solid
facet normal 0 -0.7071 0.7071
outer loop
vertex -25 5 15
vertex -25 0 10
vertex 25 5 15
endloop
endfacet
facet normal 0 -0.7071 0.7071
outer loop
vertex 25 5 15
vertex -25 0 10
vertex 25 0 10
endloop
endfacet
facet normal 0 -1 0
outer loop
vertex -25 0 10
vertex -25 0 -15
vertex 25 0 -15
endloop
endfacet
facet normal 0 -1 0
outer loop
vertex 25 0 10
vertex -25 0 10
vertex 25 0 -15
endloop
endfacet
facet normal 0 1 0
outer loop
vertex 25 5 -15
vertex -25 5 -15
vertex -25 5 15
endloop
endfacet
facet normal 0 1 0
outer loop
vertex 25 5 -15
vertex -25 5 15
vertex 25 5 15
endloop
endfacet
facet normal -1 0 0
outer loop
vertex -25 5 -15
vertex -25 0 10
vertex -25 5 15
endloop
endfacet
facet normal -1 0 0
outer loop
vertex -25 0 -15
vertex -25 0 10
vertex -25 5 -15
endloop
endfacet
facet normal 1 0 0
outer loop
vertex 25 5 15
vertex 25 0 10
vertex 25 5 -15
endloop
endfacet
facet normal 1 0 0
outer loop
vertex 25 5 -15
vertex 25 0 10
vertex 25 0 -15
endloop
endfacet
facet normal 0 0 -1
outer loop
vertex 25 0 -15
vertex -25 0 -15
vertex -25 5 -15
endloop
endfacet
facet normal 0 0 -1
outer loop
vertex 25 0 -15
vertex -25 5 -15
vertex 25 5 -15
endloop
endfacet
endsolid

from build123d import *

# Parameters (mm, degrees)
SKETCH1_W           = 50
SKETCH1_H           = 30
BOSS_EXTRUDE1_DEPTH = 5
CHAMFER1_SIZE       = 5


with BuildPart() as part:
    # Sketch1 → Boss-Extrude1 (new body)
    with BuildSketch(Plane(origin=(0, 0, 0), x_dir=(1, 0, 0), z_dir=(0, 1, 0))):
        Rectangle(SKETCH1_W, SKETCH1_H)
    extrude(amount=BOSS_EXTRUDE1_DEPTH)

    # Chamfer1
    chamfer1_edges = [part.edges().sort_by_distance(p)[0] for p in [
        (0, 0, 15),
    ]]
    chamfer(chamfer1_edges, length=CHAMFER1_SIZE - 0.0001)  # a hair under: the kernel refuses the full size


solid = part.part
